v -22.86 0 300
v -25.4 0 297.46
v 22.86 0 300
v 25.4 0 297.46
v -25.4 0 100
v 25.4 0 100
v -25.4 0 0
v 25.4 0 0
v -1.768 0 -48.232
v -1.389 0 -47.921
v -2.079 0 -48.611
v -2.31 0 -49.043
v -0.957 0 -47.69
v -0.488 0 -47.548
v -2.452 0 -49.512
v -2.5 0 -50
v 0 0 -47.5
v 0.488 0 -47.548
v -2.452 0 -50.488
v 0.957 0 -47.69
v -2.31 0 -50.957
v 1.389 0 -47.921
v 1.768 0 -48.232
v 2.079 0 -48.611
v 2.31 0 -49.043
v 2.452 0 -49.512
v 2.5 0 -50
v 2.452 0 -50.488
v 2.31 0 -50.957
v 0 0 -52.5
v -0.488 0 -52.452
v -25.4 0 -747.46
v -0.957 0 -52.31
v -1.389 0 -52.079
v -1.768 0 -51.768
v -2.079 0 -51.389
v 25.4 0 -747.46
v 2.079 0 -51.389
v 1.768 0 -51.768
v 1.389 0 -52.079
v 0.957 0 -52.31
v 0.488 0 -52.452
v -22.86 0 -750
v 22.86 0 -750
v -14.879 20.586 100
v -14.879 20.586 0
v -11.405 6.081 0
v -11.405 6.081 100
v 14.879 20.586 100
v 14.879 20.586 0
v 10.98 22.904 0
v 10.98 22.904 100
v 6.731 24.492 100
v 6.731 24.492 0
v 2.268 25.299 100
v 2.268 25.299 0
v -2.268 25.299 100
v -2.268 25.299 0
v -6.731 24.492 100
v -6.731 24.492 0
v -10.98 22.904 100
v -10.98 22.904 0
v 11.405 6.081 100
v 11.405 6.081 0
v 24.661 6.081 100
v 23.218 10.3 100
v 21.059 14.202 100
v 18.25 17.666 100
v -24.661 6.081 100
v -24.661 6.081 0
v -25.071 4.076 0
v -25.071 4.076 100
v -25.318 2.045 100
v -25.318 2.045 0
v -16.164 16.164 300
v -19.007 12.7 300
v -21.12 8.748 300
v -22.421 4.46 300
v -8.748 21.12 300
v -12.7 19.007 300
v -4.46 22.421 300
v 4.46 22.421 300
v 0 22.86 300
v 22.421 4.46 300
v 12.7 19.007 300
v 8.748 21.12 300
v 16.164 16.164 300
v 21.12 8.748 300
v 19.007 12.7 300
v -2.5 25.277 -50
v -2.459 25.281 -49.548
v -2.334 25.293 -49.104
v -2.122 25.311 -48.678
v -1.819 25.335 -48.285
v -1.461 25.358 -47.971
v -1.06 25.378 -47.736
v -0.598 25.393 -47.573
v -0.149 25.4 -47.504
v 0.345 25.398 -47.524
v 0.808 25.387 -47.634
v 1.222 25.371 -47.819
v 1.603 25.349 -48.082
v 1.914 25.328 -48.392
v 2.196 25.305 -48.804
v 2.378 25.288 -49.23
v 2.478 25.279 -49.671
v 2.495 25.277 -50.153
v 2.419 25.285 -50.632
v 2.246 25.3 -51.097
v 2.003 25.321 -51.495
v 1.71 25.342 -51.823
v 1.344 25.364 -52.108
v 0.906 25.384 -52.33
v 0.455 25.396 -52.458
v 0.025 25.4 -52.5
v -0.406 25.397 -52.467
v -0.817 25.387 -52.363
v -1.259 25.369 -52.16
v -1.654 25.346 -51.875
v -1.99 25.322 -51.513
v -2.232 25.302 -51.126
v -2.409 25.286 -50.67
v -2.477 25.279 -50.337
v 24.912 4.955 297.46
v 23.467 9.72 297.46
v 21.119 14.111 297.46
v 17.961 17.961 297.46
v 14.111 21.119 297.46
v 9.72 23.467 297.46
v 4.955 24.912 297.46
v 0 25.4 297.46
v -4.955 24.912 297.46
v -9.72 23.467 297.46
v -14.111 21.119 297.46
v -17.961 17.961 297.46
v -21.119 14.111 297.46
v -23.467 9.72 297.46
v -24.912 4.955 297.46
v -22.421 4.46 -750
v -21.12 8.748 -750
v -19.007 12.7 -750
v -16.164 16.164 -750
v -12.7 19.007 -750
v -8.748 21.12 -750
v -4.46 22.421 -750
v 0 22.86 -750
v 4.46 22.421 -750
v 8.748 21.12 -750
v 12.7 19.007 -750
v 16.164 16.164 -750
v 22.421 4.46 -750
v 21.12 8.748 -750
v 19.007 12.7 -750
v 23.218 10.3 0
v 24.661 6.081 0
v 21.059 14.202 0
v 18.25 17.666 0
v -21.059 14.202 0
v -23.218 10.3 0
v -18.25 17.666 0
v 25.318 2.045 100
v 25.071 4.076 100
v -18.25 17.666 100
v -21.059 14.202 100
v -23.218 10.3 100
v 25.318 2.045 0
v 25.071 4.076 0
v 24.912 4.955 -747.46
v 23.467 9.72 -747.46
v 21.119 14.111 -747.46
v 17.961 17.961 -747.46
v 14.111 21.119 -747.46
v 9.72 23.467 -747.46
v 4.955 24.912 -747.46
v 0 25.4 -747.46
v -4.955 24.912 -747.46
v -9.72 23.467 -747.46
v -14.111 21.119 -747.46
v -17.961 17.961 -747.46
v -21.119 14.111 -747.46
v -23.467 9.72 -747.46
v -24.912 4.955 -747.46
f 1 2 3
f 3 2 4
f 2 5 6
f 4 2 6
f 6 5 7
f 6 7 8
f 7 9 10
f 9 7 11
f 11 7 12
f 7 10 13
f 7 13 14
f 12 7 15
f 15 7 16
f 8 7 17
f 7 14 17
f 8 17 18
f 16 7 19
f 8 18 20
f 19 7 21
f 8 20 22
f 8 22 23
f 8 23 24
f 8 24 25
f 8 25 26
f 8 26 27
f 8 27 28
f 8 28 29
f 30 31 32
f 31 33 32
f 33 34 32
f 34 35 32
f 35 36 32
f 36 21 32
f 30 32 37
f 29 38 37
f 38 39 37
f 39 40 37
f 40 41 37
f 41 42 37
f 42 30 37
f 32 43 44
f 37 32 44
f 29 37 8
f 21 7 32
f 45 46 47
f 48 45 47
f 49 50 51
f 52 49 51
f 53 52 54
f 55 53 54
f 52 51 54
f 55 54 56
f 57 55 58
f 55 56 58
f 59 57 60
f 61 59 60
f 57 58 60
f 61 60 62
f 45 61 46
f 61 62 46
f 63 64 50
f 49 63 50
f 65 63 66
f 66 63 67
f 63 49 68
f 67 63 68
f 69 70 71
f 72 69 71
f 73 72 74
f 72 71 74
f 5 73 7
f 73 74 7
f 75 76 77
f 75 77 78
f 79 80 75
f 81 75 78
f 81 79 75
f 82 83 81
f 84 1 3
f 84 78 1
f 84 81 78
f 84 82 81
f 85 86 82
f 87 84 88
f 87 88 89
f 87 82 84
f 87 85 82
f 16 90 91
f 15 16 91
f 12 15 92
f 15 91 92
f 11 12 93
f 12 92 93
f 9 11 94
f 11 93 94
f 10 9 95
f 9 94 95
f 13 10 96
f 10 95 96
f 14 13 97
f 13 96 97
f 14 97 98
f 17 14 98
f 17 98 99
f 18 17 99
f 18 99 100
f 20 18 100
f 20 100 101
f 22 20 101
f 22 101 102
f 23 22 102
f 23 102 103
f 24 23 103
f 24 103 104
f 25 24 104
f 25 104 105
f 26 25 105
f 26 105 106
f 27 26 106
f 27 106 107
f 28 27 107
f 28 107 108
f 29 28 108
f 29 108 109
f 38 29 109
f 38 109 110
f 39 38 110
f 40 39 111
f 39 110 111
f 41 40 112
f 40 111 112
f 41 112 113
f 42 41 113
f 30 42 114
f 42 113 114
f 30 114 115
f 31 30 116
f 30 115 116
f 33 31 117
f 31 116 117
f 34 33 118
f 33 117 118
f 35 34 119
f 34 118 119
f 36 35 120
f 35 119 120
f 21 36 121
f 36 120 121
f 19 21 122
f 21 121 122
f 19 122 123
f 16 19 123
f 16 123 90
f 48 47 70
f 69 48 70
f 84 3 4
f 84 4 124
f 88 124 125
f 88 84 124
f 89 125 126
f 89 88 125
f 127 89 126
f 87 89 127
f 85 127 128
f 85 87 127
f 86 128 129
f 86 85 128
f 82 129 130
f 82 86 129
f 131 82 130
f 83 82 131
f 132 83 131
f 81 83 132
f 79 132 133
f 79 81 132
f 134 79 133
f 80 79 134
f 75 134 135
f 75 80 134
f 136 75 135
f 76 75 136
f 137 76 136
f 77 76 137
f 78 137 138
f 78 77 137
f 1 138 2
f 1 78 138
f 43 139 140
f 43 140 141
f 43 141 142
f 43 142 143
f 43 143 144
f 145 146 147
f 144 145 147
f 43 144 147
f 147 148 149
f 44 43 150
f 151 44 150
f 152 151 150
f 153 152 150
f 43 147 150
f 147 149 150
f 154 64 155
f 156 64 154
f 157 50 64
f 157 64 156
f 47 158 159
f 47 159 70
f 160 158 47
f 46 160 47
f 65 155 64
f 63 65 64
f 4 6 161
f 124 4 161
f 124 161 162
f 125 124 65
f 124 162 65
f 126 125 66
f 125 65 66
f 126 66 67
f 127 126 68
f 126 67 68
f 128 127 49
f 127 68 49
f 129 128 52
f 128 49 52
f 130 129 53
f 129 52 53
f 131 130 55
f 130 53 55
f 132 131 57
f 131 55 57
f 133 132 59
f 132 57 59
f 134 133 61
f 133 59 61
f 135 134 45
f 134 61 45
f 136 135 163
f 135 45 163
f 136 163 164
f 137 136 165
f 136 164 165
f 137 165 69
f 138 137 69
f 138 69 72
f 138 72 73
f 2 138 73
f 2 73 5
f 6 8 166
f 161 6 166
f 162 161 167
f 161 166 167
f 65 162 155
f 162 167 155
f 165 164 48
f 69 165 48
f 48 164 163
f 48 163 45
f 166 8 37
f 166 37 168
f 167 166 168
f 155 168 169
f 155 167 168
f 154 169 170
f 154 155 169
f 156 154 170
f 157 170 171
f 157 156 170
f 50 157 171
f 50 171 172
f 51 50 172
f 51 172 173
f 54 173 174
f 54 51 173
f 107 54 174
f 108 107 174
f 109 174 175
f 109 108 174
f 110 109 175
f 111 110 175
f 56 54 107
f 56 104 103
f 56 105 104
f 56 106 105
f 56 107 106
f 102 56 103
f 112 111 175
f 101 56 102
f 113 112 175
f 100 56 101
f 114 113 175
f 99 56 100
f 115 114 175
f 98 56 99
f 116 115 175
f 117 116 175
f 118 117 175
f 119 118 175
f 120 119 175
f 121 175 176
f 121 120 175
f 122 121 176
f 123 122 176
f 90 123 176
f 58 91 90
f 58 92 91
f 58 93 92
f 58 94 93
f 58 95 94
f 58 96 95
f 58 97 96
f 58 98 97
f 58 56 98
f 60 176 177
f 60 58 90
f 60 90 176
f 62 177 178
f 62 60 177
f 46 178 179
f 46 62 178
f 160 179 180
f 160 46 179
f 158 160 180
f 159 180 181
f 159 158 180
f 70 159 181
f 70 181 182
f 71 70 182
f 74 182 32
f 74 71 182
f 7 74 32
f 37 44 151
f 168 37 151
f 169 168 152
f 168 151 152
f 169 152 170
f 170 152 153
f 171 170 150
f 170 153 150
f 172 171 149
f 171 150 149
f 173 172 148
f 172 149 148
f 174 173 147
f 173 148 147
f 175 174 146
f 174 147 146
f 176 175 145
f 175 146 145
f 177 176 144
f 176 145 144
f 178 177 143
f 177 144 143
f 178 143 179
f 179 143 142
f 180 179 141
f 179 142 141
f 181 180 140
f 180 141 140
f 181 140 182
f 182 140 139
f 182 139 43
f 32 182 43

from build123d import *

# Parameters (mm, degrees)
F2_DEPTH = 750
F3_DEPTH = 100
F5_START = 100
F5_DEPTH = 200
F6_SIZE  = 2.54
F7_SIZE  = 2.54
F9_D     = 5


with BuildPart() as f2:
    # F0 (on Top) → F2 (new body)
    with BuildSketch(Plane.XY):
        with BuildLine():
            Line((-25.4, 0), (25.4, 0))
            ThreePointArc((25.4, 0), (0, 25.4), (-25.4, 0))
        make_face()
    extrude(amount=-F2_DEPTH)

    # F1 (on Top) → F3 (join)
    with BuildSketch(Plane.XY):
        with BuildLine():
            Line((-25.4, 0), (25.4, 0))
            ThreePointArc((25.4, 0), (25.2146859333, 3.0626154324), (24.6614477727, 6.0805422254))
            Line((24.6614477727, 6.0805422254), (11.4050507545, 6.0805422254))
            Line((11.4050507545, 6.0805422254), (14.879071159, 20.5857533611))
            ThreePointArc((14.879071159, 20.5857533611), (0, 25.4), (-14.879071159, 20.5857533611))
            Line((-14.879071159, 20.5857533611), (-11.4050507545, 6.0805422254))
            Line((-11.4050507545, 6.0805422254), (-24.6614477727, 6.0805422254))
            ThreePointArc((-24.6614477727, 6.0805422254), (-25.2146859333, 3.0626154324), (-25.4, 0))
        make_face()
    extrude(amount=F3_DEPTH)

    # F4 (on Top) → F5 (join)
    with BuildSketch(Plane.XY.offset(F5_START)):
        with BuildLine():
            Line((-25.4, 0), (25.4, 0))
            ThreePointArc((25.4, 0), (0, 25.4), (-25.4, 0))
        make_face()
    extrude(amount=F5_DEPTH)

    # F6
    f6_edges = [f2.edges().sort_by_distance(p)[0] for p in [
        (0, 25.4, -750),
    ]]
    chamfer(f6_edges, length=F6_SIZE)

    # F7
    f7_edges = [f2.edges().sort_by_distance(p)[0] for p in [
        (0, 25.4, 300),
    ]]
    chamfer(f7_edges, length=F7_SIZE)

    # F9 (through all)
    with Locations(Plane.XZ):
        with Locations((0, -50)):
            Hole(F9_D / 2)


solid = f2.part
